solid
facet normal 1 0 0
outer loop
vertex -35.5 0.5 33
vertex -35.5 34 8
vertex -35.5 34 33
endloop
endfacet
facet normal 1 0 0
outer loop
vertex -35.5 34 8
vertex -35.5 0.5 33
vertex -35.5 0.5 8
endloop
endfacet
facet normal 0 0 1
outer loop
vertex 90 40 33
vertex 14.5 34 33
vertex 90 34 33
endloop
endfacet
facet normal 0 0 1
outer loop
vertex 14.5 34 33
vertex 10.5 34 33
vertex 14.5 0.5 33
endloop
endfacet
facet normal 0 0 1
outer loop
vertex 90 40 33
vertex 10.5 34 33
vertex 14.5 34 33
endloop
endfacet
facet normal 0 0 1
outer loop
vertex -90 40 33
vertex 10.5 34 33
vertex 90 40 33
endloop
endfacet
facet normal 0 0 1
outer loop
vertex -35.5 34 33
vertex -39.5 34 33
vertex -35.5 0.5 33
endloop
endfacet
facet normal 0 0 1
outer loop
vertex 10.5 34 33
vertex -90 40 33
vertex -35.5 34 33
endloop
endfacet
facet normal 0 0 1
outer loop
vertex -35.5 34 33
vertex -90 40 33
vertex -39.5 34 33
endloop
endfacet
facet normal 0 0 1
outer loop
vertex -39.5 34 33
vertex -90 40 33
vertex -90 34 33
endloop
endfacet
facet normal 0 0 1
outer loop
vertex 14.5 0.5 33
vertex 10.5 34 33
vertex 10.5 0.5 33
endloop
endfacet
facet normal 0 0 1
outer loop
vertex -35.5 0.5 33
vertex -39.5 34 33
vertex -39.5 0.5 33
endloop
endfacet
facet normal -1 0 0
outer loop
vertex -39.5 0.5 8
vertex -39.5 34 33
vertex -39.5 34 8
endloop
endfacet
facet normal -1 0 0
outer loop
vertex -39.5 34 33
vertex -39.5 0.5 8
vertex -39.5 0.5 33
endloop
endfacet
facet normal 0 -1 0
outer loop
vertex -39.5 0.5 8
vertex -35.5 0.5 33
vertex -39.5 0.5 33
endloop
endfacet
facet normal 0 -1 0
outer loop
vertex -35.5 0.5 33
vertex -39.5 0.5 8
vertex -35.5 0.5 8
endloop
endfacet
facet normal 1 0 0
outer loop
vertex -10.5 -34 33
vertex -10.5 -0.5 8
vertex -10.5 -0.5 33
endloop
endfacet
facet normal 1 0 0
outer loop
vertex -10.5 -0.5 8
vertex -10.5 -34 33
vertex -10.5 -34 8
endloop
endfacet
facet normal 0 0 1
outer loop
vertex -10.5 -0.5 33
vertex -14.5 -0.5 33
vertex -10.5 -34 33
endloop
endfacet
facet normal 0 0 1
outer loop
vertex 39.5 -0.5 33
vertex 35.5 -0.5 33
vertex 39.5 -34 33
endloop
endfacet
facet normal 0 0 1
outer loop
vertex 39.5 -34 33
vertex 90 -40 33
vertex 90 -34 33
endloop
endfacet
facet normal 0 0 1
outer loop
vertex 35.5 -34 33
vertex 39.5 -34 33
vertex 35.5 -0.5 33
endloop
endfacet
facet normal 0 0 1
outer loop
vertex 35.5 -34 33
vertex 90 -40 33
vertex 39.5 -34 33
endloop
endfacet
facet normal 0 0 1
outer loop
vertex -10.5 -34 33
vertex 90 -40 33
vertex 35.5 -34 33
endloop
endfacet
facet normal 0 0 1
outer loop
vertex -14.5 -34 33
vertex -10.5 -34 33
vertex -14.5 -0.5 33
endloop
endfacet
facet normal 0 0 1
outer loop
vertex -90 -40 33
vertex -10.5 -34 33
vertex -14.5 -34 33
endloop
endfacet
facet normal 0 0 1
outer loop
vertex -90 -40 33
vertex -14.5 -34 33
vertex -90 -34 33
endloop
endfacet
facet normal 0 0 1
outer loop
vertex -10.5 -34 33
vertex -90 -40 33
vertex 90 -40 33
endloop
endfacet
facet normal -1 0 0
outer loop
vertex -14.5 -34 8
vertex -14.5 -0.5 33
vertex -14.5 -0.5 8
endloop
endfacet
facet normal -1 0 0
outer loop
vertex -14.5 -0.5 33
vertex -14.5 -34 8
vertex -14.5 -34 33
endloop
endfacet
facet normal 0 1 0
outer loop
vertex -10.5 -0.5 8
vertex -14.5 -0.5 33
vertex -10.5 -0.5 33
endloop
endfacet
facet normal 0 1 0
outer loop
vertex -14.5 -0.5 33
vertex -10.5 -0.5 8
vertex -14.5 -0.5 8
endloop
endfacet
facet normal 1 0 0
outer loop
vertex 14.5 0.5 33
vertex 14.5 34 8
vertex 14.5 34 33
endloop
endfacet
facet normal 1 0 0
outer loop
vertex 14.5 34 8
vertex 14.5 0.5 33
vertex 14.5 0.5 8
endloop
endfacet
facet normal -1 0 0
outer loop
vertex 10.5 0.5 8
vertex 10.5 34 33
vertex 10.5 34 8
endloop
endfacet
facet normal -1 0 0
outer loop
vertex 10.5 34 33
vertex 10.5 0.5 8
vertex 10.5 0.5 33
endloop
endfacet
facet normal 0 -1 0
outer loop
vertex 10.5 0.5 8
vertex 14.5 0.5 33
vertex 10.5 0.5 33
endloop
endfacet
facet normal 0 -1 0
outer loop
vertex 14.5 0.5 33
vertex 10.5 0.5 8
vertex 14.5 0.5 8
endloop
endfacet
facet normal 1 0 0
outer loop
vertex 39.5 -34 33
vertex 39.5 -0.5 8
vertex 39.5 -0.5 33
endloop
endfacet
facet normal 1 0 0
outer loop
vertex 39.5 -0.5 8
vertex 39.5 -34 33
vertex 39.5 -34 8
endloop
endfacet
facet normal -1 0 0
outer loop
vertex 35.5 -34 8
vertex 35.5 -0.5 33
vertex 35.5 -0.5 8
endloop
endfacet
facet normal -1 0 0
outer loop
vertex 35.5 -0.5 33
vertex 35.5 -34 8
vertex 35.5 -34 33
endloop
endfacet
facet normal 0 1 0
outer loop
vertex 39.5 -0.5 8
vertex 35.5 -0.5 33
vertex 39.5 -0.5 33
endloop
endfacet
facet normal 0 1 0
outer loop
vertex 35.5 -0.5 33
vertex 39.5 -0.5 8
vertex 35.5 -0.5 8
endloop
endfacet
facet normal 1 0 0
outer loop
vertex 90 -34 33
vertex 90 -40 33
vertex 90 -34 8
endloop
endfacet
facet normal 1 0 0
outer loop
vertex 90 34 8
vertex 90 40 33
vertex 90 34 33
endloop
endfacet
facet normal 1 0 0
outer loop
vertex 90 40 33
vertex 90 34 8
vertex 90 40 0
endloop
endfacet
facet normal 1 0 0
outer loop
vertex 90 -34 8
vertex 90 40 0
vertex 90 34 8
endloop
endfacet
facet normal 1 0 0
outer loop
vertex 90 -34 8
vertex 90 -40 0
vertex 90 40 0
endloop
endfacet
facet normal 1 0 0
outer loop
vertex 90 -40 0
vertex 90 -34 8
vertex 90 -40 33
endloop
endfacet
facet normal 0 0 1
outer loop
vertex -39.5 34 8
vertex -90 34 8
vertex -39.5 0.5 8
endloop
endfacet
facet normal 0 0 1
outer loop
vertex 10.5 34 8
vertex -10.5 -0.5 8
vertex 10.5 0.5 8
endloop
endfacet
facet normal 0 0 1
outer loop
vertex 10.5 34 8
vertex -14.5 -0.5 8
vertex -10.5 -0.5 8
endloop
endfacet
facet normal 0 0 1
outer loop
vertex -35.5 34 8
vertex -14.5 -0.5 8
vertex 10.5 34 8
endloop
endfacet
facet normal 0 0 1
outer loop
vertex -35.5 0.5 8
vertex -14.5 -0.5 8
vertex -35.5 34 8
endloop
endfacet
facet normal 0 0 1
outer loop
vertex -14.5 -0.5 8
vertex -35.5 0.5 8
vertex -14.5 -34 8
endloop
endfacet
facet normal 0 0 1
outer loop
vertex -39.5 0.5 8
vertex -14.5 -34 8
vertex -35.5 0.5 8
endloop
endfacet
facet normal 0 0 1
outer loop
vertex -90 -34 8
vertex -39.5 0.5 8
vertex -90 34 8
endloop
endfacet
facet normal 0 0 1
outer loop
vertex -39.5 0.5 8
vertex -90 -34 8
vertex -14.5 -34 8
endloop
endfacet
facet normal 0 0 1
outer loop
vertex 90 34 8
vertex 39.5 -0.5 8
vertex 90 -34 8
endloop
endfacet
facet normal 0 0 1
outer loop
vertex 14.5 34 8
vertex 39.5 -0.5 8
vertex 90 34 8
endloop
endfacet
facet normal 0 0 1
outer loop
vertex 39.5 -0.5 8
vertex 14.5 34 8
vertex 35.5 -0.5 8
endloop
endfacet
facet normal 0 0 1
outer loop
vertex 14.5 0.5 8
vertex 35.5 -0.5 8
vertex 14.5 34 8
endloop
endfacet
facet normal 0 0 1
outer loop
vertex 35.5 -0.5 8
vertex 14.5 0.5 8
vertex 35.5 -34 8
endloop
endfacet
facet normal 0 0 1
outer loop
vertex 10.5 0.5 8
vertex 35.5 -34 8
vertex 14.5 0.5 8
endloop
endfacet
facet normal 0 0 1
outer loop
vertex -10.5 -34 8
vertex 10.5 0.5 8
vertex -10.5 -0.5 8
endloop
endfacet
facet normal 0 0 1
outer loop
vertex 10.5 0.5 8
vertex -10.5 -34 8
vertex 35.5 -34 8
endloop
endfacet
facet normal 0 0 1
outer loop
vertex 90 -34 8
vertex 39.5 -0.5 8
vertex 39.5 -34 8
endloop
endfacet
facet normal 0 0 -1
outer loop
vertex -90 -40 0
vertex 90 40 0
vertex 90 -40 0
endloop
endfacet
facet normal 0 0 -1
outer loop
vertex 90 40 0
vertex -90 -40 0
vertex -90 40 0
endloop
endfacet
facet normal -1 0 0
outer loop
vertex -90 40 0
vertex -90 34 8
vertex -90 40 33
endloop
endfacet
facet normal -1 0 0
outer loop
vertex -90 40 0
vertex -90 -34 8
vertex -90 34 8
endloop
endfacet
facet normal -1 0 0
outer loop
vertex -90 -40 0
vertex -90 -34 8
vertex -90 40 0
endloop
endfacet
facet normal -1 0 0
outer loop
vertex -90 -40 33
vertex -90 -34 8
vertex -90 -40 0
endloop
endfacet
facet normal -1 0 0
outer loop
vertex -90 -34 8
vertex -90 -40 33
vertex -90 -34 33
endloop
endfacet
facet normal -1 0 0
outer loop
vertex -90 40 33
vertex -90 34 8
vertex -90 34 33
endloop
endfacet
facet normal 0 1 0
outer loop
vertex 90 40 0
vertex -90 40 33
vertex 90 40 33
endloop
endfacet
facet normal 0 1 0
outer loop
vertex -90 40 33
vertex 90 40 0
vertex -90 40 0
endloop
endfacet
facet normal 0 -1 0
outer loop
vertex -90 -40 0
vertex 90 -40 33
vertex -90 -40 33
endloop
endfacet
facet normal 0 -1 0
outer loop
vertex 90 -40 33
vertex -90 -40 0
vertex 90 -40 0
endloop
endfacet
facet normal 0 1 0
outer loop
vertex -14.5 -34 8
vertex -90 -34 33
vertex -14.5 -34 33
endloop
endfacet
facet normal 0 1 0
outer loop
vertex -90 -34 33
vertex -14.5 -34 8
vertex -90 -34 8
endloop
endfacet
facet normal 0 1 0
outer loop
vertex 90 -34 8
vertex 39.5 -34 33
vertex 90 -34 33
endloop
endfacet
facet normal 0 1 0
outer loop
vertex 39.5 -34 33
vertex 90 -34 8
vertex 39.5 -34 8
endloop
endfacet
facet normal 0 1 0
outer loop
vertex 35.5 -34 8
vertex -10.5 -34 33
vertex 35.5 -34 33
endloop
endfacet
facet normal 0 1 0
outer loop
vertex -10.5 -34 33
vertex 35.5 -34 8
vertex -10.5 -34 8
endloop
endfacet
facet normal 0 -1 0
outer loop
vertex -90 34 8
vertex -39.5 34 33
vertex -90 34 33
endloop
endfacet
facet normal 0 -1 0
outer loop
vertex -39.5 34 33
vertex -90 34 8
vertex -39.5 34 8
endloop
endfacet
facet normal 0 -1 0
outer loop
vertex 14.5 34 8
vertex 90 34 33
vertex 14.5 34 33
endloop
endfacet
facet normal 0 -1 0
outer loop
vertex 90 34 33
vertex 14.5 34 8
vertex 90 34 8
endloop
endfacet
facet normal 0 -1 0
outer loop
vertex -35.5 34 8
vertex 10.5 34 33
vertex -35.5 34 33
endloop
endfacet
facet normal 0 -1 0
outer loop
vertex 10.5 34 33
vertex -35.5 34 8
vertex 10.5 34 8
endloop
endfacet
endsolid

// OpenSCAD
$fn = 32;

// ----------------------------------------------------------------------
// Rib frame 180 x 80 x 33
// 4 ribs at 25 mm pitch, staggered
// ----------------------------------------------------------------------

// --- parameters (mm) ---
frame = [180, 80, 8];  // base plate size (x, y, z)
rail_w = 6;            // side rail width
ribs = 4;              // number of ribs
rib_t = 4;             // rib thickness
rib_h = 25;            // rib height above the base plate
pitch = 25;            // pitch between rib centres

// --- derived feature positions (mm) ---
span = (ribs - 1) * pitch;          // = 75   distance between the outer ribs
origin_x = -span / 2;               // = -37.5   X of the first rib
rib_len = frame[1] / 2 - rail_w + 0.5;  // = 34.5   length of a staggered rib
rib_y = 0.5 + rib_len / 2;          // = 17.75   Y of a staggered rib centre
row_offset = 2 * rib_y;             // = 35.5   distance between the two rows
feature_centers = [
  [origin_x + 0 * pitch, rib_y],
  [origin_x + 1 * pitch, -rib_y],
  [origin_x + 2 * pitch, rib_y],
  [origin_x + 3 * pitch, -rib_y]
];   // rib centre line, drives the rib loop

// base plate, two side rails, then the ribs read straight off feature_centers
union() {
  translate([-frame[0] / 2, -frame[1] / 2, 0]) cube(frame);
  translate([-frame[0] / 2, -frame[1] / 2, 0]) cube([frame[0], rail_w, frame[2] + rib_h]);
  translate([-frame[0] / 2, frame[1] / 2 - rail_w, 0]) cube([frame[0], rail_w, frame[2] + rib_h]);
  for (centre = feature_centers)
    translate([centre[0] - rib_t / 2, centre[1] - rib_len / 2, frame[2] - 1])
      cube([rib_t, rib_len, rib_h + 1]);
}
